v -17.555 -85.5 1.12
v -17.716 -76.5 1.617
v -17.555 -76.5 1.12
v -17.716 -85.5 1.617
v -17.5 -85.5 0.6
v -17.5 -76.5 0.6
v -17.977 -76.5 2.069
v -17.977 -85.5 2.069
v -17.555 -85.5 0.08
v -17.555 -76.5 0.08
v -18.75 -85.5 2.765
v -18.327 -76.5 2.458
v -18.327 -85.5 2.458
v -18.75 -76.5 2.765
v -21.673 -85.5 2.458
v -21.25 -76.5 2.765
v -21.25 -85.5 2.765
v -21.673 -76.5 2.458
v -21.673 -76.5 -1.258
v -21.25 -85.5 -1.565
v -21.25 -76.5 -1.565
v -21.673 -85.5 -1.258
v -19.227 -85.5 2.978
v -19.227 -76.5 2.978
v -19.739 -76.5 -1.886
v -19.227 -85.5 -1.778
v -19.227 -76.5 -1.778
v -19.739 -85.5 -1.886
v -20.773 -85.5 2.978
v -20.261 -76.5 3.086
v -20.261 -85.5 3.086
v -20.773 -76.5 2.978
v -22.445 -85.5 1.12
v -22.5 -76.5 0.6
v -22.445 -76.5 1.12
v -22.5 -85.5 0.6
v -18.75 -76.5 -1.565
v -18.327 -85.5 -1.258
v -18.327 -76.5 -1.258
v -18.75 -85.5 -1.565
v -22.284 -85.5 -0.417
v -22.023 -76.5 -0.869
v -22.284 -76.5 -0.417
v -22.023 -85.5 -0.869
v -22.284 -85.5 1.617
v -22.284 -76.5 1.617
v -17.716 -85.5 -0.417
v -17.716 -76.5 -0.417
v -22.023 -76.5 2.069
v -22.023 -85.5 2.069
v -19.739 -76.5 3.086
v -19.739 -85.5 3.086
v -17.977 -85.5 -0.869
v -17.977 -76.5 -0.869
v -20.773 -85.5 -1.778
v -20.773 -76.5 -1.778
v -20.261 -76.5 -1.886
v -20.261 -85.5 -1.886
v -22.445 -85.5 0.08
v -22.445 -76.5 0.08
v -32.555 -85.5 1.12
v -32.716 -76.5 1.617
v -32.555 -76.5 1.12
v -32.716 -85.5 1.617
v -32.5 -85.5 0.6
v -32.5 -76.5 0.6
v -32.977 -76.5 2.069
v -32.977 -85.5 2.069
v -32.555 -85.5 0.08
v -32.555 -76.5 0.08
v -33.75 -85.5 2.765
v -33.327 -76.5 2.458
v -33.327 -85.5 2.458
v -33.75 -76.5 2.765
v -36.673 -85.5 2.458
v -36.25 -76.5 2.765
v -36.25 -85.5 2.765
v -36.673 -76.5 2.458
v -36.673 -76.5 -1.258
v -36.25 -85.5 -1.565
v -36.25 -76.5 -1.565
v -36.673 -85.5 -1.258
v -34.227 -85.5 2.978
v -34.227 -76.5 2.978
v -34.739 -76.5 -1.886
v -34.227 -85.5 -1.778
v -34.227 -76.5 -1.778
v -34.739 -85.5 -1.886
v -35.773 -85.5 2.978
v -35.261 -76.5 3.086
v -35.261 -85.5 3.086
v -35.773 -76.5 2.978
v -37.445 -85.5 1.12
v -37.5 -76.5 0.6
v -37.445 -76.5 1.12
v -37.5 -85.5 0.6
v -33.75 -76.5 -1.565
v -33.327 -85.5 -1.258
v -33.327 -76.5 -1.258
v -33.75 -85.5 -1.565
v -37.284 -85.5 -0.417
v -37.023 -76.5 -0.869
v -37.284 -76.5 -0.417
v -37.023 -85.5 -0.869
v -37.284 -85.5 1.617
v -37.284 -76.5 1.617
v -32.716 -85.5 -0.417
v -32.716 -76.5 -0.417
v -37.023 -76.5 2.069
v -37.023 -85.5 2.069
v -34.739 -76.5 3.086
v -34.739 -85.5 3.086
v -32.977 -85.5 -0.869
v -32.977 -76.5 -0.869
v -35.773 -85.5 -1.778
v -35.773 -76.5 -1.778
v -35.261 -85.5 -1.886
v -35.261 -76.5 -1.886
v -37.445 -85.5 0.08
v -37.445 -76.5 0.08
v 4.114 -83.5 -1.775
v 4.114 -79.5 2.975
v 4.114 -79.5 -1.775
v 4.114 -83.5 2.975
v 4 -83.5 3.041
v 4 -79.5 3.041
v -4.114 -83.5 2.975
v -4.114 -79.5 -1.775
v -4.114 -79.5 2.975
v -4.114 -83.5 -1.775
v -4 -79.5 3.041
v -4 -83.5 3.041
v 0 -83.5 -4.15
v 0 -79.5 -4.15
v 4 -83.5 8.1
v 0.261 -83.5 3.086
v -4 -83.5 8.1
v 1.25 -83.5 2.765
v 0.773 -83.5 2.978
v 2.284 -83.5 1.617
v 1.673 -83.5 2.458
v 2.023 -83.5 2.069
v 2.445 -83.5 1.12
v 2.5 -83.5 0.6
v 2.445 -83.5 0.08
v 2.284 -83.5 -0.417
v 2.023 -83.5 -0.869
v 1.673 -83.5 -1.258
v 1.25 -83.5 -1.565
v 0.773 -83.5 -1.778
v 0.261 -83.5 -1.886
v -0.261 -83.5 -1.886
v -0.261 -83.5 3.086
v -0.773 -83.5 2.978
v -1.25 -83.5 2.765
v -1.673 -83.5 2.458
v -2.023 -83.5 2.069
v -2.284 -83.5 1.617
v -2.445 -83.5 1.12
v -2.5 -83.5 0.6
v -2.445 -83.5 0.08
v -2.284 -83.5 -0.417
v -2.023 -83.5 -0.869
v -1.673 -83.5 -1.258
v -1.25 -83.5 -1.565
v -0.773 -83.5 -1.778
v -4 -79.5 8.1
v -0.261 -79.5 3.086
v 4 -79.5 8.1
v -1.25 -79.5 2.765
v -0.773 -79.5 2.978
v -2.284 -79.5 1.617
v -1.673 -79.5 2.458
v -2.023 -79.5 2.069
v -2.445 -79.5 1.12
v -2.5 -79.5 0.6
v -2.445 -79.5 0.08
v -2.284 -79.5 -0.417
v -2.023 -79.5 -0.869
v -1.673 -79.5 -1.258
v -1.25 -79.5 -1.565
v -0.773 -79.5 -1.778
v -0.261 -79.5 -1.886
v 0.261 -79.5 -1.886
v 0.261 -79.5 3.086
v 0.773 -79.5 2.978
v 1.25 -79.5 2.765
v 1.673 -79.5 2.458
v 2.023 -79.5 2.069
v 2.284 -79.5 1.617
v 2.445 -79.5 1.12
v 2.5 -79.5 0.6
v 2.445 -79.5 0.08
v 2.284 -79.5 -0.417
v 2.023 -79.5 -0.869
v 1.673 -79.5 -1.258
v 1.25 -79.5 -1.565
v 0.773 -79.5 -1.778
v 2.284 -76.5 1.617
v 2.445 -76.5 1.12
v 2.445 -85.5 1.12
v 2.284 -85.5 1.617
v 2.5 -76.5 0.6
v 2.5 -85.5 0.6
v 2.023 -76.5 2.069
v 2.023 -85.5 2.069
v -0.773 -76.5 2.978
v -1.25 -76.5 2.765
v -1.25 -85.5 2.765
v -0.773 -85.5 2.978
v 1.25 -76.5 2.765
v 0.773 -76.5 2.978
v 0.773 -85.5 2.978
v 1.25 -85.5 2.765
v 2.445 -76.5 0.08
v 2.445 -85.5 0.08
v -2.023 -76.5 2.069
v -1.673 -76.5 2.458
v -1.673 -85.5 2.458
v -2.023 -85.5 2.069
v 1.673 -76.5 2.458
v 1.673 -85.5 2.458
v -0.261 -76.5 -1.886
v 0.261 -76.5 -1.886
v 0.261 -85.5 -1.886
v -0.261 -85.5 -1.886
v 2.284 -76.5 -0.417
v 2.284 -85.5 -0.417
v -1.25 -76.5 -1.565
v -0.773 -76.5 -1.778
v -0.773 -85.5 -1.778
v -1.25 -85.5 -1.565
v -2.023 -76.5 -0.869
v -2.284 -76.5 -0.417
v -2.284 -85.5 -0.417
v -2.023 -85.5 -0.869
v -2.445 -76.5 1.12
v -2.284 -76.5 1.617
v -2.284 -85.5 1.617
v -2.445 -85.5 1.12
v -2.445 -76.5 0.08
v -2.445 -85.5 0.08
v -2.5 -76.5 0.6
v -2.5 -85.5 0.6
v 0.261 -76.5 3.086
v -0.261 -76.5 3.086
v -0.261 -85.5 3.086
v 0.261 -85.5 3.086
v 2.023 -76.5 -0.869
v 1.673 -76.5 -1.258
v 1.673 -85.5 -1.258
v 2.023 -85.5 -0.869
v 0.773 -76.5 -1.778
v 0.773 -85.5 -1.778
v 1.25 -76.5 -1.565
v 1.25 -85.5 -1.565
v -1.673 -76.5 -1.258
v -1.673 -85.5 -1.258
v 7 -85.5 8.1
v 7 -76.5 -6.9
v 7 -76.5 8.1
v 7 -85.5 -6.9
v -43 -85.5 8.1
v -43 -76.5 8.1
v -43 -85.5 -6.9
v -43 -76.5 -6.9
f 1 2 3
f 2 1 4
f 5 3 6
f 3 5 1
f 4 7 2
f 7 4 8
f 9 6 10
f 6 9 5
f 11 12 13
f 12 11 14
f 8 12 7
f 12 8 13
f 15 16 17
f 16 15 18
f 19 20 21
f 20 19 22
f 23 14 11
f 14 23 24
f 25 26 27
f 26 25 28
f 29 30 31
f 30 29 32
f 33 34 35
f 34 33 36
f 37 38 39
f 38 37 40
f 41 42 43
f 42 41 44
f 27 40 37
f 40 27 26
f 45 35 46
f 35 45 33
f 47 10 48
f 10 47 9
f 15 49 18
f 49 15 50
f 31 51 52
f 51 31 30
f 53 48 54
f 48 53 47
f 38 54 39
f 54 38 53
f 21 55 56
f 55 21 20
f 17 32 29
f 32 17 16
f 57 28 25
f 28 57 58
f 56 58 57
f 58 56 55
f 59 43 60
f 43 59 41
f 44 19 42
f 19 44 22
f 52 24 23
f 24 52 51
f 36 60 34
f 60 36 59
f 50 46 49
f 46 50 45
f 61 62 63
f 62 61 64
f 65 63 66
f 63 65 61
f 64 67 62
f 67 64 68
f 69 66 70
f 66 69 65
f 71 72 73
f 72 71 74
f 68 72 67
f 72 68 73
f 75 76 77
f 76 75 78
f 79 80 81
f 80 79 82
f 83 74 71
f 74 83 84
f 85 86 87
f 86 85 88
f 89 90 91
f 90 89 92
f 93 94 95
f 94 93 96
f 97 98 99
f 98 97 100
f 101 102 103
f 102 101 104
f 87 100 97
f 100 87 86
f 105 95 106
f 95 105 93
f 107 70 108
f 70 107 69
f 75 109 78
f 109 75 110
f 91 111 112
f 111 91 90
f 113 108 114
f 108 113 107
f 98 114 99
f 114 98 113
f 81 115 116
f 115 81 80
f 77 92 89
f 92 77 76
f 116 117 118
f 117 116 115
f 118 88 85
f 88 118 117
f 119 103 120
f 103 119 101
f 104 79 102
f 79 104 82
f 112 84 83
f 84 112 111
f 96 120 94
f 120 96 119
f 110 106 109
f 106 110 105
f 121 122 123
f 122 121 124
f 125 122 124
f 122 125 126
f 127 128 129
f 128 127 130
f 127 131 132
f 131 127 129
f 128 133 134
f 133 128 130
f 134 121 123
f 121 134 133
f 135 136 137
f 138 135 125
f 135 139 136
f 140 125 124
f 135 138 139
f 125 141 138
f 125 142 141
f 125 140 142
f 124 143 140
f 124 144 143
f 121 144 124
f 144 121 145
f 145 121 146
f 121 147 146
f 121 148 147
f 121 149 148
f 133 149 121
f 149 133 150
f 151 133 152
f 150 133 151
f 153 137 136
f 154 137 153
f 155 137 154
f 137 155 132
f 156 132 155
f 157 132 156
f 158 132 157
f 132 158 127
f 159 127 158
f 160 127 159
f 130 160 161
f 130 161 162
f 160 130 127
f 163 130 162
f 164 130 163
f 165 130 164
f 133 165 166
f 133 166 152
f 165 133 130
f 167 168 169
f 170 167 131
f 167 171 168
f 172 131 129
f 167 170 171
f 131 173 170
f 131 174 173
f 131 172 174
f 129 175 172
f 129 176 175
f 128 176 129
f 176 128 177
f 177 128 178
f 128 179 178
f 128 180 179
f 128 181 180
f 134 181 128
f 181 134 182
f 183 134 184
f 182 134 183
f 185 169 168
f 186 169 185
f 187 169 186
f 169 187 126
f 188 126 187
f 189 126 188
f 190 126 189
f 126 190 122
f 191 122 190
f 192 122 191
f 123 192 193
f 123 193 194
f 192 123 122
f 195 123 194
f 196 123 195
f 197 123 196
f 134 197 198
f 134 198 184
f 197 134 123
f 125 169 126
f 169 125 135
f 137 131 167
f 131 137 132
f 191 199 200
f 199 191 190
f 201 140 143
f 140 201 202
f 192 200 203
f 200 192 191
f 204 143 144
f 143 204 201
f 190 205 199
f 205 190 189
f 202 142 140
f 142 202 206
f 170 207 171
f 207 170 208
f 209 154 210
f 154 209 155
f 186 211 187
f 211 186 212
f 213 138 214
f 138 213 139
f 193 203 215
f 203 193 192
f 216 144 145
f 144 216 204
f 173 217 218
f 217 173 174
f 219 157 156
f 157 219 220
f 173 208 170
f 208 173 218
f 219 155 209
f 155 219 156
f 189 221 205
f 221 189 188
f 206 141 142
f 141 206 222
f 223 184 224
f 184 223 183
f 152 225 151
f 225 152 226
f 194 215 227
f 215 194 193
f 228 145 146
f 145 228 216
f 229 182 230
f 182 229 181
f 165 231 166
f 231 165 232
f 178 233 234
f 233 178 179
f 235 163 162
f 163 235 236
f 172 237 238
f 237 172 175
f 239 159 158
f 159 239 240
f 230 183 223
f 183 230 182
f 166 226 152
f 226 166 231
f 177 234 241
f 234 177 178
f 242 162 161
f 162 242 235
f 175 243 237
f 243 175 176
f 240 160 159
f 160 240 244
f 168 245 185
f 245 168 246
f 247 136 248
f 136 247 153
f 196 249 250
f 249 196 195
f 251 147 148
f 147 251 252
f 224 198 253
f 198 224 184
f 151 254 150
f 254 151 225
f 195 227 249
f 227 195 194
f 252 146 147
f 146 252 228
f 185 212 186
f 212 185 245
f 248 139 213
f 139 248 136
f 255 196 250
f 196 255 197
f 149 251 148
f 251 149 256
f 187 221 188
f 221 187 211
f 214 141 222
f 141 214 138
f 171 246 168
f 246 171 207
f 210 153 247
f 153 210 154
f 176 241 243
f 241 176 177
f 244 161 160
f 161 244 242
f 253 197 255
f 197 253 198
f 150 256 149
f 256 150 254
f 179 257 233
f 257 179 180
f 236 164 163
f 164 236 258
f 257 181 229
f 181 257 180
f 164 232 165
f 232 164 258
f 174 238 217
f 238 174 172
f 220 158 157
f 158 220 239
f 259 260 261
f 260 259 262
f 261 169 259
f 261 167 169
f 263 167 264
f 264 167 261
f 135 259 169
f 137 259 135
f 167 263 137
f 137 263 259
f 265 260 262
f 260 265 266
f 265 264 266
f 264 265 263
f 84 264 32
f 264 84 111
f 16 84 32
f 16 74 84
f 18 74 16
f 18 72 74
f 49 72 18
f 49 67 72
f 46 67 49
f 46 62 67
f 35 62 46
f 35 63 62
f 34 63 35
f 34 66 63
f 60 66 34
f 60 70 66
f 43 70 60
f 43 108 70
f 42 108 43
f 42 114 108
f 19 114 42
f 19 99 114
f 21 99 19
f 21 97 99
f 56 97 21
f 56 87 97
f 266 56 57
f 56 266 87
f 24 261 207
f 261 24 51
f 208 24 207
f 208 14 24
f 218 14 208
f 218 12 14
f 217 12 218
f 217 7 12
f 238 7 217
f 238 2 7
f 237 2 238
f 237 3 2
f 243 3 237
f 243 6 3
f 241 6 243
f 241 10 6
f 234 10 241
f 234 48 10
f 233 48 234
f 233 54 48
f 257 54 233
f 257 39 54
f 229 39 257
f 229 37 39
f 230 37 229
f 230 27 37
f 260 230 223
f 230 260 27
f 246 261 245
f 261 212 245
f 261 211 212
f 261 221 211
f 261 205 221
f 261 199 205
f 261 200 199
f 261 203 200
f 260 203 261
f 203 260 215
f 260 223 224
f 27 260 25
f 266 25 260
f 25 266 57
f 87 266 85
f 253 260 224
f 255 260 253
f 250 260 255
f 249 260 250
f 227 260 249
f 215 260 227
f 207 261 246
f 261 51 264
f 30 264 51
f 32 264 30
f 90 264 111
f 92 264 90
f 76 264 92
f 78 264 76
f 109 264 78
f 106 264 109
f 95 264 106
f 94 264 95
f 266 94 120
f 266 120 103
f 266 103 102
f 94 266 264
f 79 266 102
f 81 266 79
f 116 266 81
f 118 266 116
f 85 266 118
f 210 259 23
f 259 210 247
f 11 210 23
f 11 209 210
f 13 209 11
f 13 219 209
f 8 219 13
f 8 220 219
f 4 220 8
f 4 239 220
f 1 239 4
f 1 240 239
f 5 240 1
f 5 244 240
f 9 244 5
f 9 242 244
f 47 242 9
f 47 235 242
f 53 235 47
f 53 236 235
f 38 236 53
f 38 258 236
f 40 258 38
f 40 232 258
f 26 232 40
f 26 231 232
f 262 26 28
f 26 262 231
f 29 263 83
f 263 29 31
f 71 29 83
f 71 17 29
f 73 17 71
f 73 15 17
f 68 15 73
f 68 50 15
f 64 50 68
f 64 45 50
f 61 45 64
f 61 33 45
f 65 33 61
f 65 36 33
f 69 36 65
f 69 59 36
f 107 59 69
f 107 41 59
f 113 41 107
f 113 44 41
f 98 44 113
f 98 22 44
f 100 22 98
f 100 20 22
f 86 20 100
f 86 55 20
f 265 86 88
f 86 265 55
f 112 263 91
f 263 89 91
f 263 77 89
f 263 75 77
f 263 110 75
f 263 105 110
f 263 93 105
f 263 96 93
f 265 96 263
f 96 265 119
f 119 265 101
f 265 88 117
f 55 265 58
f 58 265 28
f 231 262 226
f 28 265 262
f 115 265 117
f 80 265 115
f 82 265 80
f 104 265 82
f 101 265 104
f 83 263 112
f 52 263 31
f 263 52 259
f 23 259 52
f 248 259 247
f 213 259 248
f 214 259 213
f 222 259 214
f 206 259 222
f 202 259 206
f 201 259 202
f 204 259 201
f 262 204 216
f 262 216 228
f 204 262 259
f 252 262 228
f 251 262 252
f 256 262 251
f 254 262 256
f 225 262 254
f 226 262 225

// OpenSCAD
include <BOSL/constants.scad>
use <BOSL/transforms.scad>
use <BOSL/shapes.scad>

//Load cell properties
lcX = 80;
lcY = 12.7;
lcZ = lcY;

x = lcX+5;
y = 20;
z = 65;
wall = 1.2;

$fn = 30;
connector = "rj45"; //"rj45" or "none"
y2 = 20;
master = true;
d_rod = 10.5;


module hook(){
   difference(){
      linear_extrude(7)import("haken.svg");
      translate([15,40,3.5])ycyl(d=5,h=20);
      translate([15,38.5,3.5])ycyl(d=9,h=4,$fn=6);
      rotate([5,-4,0])translate([20,25,5])cuboid([40,50,5]);
      }
}




module rj45(){
   difference(){
      import("parts/keystone.stl");
   }
}


 module screwshaft(d1=4,d2=2,h=5){
        translate([0,0,0])rotate([90,0,0])difference(){
            cylinder(d=d1,h=h);
            cylinder(d=d2,h=h);
        }
    }
    
module holes(dMount = 5,dLoad = 5){
  
   rotate([90,0,0]){
   //holes that fit into the load cell
        for(i=[[20,0,-30],[35,0,-30]]){
            translate(i)cylinder(h = 60, d = dMount);
        }
            //hole for mount
        for(i=[[-20,0,-30],[-35,0,-30]]){

        translate(i)cylinder(h = 60, d = dLoad);   
        }
     }
    }
    
module trapez(x1 = 30, x2 = 20, y = 5){
   polygon(points=[[-x1/2,0],[-x2/2,y],[x2/2,y],[x1/2,0]]);
}

module rod_cross(d= d_rod, h = 100){
   translate([0,0,-h/2])cylinder(d = d_rod, h = h);
   translate([-h/2,0,0])rotate([0,90,0])cylinder(d = d_rod, h = h);
}


module connectorA(){
   x = 20;
   y = 20;
   z = 20;
   height = 7;
   
   difference(){
      cuboid([x,y,z]);
      translate([0,9,0])rotate([90,0,0]){
            rotate([0,0,90])cylinder(h = 3.5, d=8, $fn = 6);
            translate([0,10,1.7])cube([7,20,3.5],center = true);
           translate([0,0,-2.5])cylinder(d = 5, h =10);
          }
          translate([0,-2,0])rod_cross();

   }
   translate([0,-y/2-height,-z/2])linear_extrude(z)trapez(30,20,height);
   
   //screw holder
  
}
module loadcell(){
    difference(){
    cube([lcX,lcY,lcZ],center = true);
    holes();}
}


module connectorB(){
   xCh = lcX;
   z = 20;
   y = 12;
   height = 7;

   difference(){
      cuboid([xCh,y,z]);
      translate([0,y/2-height-0.2,-z/2])linear_extrude(z)trapez(30.8,20.8,height+0.2);
      holes();
      back(30)holes(10,0);
   }

}

module load_connector(){
    difference(){
       left(18)fwd(21)cuboid([x-35,9,y-5]);
        holes();
        fwd(10)rotate([90,0,0])cylinder(h=20,d=5);
       translate([0,-19.5,0])rotate([90,0,0]){
            rotate([0,0,90])cylinder(h = 4, d=9.5, $fn = 6);
            translate([0,10,2])cube([8,20,4],center = true);
           translate([0,0,-2.5])cylinder(d = 5, h =10);
          }
    }
 }
 
 
 
module case(x=x,y=y,z=z,a=1){
    difference(){
       cuboid([x+wall*2,y+wall*2,z+wall*2],fillet = 3, edges=EDGES_Y_ALL);
        translate([0,-a*wall,0])cuboid([x,y+wall,z],fillet = 3, edges=EDGES_Y_ALL);
           

    }
}

module lolin_lid(){
   h_lol =5.5;
   module lolinmount(){
    
    lolinypos =20;
    d1 = 4;
    d2 = 2;
    x_lol=26;
    y_lol=49.5;
    lolinpos = 0;
    color("blue"){
    translate([-4,-1,0]){
    translate([-lolinpos-9,22.5,0])difference(){
        up(h_lol/2)right(10)cube([x_lol,d1,h_lol],center = true);//cylinder(h = h_lol,d =d1);
        up(1)cylinder(h = h_lol,d =d2);
    }
    translate([-lolinpos+12,-16,0])difference(){
        up(h_lol/2)left(11)fwd(2)cube([x_lol,d1*2,h_lol],center = true);
        //cylinder(h = h_lol,d =d1);
        up(1)cylinder(h = h_lol,d =d2);
    }
}
}
             
}
      //rj45 jack
      if(connector == "rj45"){
         translate([28.7,-0.5,66])rj45();
      }
      y = y2;
      difference(){
         union(){
            case(x,y,z,-1);
             for(i=[[-x/2+wall+1,y/2+wall,-z/2+wall+01],
        [x/2-wall-1,y/2+wall,z/2-wall-1],
        [x/2-wall-1,y/2+wall,-z/2+wall+1],
        [-x/2+wall+1,y/2+wall,z/2-wall-1] ]){
        translate(i)screwshaft(6,0,y+1);
        }
       }
         if(master){
         //BATTERY connector
         translate([x/2+1,-y/2+h_lol+3.7,7.2-6-5])cuboid([2*wall,6,7]);
         //USB connector
         translate([x/2+1,-y/2+h_lol+2.5,-8.5-6-5])cuboid([2*wall,4,8]);
         
         //tara button hole
         translate([x/2+1,0,17])cuboid([2*wall,6,6]);
         }
         //rod hole
       translate([0,50,20.5])rotate([90,0,0])cylinder(d = d_rod, h = 100);
         //rj45 hole
         if(connector == "rj45"){
         translate([-x/2,-1,10])cuboid([3,16,20]);
            }
       for(i=[[-x/2+wall+0.5,y/2-wall,-z/2+wall+0.5],
        [x/2-wall-0.5,y/2-wall,z/2-wall-0.5],
        [x/2-wall-0.5,y/2-wall,-z/2+wall+0.5],
        [-x/2+wall+0.5,y/2-wall,z/2-wall-0.5] ]){
        translate(i){
            screwshaft(4,0,y);
            back(5)screwshaft(2,0,y);
        }
    }

    }
    *translate([-0,-y/2+h_lol,10-6-5])rotate([90,0,0])import("parts/lolin32_lite.stl");
    
    //mounting brackets for lolin lite
    if(master){
    translate([17,-y/2,-15])rotate([-90,90,0])lolinmount();
    }
    
}
module load_cell_case(){
   difference(){ 
   union(){
       color("green")case();
       for(i=[[-x/2+wall+0.5,y/2-wall,-z/2+wall+0.5],
           [x/2-wall-0.5,y/2-wall,z/2-wall-0.5],
           [x/2-wall-0.5,y/2-wall,-z/2+wall+0.5],
           [-x/2+wall+0.5,y/2-wall,z/2-wall-0.5] ]){
           translate(i)screwshaft(4,2,y);
       }}
    fwd(wall/2)up(20.5)rotate([90,0,0])rod_cross();
    // hole for screw 
    fwd(wall/2)down(-z/2+10)cylinder(d = 5,h = 20);
    // hole for load hook
    fwd(wall/2)down(z/2+10)cylinder(d = 10,h = 20);   
   
       }
}

up(40)rotate([-90,0,0])lolin_lid();


rotate([-90,0,0])load_cell_case();
up(wall/2)back(22.5)connectorA();
*fwd(60)up(wall/2)back(22.5)translate([0,-16,0])connectorB();

!fwd(60)up(wall/2)load_connector();

*fwd(8)loadcell();
*hook();
